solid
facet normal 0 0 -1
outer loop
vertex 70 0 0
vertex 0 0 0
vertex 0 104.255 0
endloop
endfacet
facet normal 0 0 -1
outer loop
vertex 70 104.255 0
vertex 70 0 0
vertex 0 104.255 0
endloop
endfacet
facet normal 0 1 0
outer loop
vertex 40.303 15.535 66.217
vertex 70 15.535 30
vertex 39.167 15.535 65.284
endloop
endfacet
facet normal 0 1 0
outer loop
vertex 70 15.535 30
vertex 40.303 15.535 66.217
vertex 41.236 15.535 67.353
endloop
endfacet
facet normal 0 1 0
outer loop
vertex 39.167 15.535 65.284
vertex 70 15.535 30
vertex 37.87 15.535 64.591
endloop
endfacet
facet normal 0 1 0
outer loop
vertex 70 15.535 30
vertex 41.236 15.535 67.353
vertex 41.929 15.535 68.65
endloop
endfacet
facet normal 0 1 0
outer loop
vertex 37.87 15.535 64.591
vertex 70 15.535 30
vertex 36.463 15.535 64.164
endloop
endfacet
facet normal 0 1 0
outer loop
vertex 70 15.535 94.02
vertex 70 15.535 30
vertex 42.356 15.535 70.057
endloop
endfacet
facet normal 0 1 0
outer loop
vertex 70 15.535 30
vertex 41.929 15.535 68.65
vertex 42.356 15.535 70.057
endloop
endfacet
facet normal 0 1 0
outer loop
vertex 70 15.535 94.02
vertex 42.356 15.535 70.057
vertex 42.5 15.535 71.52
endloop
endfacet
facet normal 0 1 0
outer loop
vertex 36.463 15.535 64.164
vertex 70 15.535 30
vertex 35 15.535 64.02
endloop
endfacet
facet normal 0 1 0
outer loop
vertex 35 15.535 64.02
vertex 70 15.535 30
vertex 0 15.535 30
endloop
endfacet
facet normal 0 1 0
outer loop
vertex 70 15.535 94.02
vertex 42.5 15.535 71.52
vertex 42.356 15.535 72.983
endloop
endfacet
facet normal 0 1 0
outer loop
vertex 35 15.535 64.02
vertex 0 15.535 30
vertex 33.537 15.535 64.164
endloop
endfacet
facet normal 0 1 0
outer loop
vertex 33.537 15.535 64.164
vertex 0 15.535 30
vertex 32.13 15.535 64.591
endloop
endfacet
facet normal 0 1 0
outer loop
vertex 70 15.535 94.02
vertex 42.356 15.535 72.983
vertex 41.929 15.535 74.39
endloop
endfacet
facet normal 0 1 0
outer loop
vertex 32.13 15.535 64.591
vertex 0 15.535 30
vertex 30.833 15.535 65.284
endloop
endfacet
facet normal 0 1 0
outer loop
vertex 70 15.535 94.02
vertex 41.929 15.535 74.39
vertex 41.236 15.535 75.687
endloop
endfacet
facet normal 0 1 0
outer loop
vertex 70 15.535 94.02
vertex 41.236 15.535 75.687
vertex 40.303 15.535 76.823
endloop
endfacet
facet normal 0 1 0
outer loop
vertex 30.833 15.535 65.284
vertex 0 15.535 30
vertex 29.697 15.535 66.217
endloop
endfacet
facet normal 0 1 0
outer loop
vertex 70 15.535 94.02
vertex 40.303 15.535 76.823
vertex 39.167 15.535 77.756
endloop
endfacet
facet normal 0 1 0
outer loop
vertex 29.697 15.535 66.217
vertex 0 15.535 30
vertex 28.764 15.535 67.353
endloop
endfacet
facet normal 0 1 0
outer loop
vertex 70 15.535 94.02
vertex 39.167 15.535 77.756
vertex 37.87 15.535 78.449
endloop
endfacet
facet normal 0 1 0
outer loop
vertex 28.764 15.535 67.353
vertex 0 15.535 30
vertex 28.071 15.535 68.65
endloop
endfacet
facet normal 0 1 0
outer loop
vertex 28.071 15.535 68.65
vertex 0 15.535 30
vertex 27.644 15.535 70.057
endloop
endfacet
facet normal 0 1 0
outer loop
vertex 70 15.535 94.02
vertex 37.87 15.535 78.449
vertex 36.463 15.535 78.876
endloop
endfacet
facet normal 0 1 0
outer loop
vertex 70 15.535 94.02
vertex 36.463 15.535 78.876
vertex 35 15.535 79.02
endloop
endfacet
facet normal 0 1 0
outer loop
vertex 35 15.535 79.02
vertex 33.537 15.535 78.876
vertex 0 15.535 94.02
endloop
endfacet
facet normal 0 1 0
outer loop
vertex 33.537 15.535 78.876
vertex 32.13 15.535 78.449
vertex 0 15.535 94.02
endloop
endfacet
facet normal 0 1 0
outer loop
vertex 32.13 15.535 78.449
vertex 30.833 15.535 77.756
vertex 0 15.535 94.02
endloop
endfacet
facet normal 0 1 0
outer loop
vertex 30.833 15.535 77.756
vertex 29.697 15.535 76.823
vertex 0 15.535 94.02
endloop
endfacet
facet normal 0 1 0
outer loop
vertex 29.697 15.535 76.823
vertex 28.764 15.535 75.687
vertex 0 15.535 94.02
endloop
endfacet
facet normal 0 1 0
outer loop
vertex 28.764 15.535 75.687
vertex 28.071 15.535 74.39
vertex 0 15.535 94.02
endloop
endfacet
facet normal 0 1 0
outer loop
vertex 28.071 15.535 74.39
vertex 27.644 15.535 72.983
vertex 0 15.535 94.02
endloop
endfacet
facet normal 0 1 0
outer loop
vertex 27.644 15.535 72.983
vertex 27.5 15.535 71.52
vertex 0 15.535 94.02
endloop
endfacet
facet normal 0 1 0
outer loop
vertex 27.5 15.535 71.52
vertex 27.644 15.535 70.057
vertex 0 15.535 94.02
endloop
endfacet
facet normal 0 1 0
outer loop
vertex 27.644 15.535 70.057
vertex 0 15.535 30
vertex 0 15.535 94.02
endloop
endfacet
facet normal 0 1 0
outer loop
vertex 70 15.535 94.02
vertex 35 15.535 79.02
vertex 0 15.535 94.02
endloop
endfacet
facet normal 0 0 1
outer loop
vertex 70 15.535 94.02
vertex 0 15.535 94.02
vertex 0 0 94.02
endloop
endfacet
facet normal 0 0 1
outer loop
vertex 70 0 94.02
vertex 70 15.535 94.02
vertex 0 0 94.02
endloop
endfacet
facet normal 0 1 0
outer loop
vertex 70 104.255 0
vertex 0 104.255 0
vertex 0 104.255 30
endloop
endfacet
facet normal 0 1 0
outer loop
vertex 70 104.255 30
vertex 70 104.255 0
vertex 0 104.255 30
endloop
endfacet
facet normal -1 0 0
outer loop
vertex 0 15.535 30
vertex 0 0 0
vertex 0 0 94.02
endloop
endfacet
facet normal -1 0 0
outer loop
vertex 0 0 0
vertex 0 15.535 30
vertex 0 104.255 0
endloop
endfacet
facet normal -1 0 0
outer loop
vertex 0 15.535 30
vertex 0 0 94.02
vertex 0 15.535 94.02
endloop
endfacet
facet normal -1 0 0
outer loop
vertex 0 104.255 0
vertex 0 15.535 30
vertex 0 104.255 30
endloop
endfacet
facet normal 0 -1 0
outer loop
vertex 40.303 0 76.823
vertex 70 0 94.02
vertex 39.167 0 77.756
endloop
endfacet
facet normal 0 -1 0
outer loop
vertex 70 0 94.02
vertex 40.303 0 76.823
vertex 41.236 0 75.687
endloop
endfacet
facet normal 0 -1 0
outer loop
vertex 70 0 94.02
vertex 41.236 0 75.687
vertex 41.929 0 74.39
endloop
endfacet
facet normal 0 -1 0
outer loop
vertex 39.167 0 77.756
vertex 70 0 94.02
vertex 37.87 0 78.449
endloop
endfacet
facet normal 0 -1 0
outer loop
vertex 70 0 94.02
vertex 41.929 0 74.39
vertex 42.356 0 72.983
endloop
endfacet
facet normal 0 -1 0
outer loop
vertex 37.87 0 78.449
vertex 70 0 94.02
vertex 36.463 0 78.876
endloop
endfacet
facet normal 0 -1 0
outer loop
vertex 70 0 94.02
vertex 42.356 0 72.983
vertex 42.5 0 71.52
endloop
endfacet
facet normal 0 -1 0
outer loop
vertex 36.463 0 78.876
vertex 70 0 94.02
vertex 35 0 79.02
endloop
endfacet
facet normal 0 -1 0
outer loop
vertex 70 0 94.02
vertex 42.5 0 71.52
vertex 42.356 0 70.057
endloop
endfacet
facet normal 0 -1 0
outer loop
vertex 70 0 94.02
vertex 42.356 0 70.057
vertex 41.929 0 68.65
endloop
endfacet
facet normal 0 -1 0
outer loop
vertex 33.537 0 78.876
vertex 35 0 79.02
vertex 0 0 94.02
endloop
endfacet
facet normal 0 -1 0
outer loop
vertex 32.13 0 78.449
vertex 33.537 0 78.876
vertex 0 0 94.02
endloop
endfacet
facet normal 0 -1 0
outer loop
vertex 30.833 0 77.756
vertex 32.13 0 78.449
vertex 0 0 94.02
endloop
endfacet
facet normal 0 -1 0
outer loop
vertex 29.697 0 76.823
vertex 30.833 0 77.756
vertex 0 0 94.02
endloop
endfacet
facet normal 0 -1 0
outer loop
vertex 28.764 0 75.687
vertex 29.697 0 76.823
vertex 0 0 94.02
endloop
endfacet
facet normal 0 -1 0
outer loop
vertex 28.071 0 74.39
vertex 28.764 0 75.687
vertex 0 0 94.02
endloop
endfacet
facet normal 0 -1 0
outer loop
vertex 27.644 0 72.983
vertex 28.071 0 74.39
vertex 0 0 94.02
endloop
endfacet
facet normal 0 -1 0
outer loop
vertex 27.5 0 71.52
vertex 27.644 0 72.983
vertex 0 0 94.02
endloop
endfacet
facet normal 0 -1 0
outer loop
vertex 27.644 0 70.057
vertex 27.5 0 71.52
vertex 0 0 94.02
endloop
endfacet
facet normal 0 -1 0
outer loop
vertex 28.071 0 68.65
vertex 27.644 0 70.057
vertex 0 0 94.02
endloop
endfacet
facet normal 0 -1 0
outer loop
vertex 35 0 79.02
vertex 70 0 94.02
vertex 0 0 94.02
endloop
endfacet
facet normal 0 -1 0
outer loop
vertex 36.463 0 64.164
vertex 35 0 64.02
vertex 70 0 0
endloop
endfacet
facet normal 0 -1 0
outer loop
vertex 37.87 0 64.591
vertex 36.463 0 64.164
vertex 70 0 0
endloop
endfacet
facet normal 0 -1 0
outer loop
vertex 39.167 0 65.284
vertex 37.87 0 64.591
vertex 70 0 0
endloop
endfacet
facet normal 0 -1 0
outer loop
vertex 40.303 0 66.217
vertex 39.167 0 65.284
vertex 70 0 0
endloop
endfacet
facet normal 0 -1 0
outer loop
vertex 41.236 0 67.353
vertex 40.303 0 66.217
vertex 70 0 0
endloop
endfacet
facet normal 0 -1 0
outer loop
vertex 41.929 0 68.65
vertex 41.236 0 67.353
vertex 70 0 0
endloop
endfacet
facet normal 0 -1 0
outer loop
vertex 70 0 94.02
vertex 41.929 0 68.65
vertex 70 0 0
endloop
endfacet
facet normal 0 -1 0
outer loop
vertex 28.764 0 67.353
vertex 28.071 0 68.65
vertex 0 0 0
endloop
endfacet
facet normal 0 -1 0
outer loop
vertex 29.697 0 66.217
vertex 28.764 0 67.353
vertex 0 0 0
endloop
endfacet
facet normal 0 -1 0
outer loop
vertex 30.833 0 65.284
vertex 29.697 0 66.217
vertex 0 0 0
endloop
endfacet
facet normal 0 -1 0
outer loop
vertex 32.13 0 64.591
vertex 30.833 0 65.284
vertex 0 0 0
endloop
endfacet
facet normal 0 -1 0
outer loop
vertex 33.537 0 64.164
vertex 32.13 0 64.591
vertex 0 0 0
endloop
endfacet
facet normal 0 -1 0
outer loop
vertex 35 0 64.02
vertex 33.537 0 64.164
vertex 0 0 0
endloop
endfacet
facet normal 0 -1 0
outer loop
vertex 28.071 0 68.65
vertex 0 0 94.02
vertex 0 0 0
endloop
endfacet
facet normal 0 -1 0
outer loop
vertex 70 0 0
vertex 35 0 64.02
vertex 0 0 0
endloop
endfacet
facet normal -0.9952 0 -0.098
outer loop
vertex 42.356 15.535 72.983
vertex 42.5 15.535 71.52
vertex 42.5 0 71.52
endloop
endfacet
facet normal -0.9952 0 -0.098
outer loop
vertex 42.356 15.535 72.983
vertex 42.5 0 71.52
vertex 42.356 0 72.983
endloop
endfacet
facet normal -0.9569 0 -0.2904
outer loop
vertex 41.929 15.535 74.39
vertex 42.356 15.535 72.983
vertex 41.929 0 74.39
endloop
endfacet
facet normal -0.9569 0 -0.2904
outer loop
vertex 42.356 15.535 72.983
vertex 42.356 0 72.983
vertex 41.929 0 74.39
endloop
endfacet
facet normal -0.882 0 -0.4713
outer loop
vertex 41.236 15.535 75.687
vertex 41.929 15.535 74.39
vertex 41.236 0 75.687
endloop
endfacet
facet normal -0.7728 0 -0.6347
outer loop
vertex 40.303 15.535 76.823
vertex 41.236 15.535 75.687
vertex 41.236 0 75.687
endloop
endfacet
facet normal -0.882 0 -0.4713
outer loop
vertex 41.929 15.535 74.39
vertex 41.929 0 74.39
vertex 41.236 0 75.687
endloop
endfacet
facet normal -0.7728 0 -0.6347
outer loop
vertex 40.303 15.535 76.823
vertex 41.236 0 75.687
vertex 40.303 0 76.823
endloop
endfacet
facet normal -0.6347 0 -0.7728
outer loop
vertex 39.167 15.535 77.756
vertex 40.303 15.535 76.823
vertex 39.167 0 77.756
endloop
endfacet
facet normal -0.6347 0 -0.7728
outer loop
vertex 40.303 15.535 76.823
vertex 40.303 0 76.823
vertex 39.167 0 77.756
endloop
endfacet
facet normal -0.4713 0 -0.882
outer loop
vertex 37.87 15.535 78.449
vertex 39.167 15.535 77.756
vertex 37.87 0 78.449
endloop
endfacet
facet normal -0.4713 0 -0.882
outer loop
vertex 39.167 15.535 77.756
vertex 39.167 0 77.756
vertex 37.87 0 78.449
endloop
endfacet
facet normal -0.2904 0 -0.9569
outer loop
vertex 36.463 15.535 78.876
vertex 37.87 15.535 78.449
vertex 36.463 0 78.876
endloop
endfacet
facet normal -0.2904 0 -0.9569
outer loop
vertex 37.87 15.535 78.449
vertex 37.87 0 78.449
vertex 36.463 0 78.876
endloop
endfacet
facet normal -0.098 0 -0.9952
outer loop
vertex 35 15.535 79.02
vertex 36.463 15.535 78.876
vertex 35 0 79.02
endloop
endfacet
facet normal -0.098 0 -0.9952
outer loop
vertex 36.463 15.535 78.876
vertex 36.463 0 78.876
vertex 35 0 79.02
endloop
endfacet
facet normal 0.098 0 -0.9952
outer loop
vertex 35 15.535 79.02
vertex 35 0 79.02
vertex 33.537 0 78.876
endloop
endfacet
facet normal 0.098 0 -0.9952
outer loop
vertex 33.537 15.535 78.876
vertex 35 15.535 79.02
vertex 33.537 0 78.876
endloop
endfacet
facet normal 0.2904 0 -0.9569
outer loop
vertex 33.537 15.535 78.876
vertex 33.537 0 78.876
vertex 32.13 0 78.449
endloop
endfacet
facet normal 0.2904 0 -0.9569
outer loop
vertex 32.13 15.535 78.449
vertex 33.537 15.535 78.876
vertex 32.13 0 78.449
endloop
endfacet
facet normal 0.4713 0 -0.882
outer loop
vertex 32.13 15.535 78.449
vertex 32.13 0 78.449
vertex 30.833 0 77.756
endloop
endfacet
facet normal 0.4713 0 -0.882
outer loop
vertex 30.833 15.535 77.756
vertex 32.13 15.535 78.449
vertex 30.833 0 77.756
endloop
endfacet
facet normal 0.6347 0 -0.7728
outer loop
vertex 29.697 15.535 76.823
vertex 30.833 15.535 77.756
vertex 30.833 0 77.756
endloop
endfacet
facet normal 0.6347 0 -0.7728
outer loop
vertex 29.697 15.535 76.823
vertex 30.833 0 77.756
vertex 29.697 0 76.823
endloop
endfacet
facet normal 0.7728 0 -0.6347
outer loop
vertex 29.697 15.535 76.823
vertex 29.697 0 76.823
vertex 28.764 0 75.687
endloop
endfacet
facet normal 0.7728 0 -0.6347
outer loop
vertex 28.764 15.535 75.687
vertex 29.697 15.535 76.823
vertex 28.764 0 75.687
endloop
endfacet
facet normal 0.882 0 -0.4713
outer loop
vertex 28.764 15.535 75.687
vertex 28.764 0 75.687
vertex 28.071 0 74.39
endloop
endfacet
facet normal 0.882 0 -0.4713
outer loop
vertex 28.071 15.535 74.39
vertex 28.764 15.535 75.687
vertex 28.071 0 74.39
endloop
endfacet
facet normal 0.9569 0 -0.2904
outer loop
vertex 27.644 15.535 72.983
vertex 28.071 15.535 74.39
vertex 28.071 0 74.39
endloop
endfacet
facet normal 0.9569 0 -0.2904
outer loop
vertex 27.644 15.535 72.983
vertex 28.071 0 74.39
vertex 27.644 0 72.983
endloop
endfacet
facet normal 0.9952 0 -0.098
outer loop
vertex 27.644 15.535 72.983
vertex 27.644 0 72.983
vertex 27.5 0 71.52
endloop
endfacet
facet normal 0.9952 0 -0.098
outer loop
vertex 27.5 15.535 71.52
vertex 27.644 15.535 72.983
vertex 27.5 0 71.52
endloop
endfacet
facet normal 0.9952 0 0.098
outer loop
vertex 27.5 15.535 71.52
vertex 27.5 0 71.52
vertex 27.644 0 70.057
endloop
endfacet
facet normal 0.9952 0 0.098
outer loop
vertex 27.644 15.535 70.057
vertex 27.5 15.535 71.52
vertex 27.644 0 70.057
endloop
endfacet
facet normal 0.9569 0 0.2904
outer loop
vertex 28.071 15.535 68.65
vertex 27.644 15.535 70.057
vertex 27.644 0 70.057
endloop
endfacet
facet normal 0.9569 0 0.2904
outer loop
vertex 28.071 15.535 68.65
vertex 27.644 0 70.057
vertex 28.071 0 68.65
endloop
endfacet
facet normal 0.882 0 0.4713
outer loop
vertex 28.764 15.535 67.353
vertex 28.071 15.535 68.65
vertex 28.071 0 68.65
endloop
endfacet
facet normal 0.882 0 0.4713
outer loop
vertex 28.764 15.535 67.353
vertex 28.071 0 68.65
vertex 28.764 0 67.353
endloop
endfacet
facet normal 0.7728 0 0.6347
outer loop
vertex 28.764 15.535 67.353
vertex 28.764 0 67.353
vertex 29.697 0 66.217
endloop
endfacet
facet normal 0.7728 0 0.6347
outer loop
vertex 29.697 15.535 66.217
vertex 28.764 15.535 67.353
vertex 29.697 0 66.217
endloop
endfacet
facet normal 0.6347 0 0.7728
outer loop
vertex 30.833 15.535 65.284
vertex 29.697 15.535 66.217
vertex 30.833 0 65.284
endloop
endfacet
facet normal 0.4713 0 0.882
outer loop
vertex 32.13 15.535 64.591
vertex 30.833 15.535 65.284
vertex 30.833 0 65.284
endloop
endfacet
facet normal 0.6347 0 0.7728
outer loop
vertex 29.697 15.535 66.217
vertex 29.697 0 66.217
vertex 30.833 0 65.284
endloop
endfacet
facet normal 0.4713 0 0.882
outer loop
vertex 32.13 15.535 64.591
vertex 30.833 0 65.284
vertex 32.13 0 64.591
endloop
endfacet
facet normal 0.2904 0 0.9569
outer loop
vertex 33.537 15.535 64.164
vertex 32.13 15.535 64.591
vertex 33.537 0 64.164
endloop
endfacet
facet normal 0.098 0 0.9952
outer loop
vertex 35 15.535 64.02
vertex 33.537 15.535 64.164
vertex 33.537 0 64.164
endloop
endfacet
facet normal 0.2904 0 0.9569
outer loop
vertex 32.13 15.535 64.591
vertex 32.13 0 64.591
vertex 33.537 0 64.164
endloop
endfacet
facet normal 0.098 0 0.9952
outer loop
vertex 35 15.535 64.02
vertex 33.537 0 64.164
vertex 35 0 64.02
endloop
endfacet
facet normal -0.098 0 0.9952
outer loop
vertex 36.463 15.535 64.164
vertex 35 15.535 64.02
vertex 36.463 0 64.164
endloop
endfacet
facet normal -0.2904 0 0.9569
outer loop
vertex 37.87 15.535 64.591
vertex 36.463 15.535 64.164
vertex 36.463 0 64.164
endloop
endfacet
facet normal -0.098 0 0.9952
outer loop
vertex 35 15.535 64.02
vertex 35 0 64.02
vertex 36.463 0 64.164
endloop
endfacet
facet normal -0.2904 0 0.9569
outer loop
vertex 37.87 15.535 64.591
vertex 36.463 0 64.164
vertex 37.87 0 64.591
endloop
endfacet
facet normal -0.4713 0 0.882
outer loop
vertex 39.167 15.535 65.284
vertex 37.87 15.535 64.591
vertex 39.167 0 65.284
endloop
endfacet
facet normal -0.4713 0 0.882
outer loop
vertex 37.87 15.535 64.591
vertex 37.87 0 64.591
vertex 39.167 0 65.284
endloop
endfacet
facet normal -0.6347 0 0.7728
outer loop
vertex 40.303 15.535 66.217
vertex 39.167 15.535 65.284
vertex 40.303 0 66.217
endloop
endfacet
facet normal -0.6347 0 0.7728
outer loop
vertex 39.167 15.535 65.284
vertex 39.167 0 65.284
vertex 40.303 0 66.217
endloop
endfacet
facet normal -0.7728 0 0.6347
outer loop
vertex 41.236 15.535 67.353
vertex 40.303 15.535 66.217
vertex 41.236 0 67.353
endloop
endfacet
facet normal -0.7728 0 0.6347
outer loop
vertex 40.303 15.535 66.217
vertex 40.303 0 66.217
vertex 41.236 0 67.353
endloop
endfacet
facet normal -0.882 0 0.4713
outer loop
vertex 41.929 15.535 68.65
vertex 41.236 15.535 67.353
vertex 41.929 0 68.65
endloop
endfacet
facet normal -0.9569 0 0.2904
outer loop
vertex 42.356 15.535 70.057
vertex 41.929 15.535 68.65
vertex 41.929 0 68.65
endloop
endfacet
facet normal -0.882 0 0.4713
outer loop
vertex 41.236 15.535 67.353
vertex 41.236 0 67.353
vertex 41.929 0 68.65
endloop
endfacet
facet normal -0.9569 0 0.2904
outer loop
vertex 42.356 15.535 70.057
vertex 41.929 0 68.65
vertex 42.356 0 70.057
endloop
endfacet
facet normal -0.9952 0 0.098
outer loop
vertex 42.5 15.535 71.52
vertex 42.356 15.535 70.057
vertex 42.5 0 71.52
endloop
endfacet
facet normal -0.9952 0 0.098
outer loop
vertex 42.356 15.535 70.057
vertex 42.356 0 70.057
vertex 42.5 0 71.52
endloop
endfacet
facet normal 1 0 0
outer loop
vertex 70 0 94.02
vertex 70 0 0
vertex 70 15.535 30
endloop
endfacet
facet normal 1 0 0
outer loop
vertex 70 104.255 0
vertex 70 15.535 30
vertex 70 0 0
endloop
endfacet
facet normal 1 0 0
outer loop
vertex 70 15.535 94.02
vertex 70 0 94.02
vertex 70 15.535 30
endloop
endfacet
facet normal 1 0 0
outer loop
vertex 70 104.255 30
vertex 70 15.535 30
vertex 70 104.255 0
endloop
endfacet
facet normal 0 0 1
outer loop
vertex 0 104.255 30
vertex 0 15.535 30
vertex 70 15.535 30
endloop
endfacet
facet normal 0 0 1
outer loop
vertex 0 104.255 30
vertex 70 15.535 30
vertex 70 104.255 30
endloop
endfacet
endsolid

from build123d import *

# Parameters (mm, degrees)
F0_W     = 88.720875
F0_H     = 30
F1_DEPTH = 70
F2_R     = 7.5
F3_DEPTH = 25


with BuildPart() as f1:
    # F0 (on Right) → F1 (new body)
    with BuildSketch(Plane.YZ):
        with Locations((59.895014, 15)):
            Rectangle(F0_W, F0_H)
        Polygon((0, 94.020176), (0, 0), (15.534577, 0), (15.534577, 30), (15.534577, 94.020176), align=None)
    extrude(amount=F1_DEPTH)

    # F2 (on face) → F3 (cut)
    with BuildSketch(Plane.XZ):
        with Locations((35, 71.520176)):
            Circle(F2_R)
    extrude(amount=-F3_DEPTH, mode=Mode.SUBTRACT)


solid = f1.part
